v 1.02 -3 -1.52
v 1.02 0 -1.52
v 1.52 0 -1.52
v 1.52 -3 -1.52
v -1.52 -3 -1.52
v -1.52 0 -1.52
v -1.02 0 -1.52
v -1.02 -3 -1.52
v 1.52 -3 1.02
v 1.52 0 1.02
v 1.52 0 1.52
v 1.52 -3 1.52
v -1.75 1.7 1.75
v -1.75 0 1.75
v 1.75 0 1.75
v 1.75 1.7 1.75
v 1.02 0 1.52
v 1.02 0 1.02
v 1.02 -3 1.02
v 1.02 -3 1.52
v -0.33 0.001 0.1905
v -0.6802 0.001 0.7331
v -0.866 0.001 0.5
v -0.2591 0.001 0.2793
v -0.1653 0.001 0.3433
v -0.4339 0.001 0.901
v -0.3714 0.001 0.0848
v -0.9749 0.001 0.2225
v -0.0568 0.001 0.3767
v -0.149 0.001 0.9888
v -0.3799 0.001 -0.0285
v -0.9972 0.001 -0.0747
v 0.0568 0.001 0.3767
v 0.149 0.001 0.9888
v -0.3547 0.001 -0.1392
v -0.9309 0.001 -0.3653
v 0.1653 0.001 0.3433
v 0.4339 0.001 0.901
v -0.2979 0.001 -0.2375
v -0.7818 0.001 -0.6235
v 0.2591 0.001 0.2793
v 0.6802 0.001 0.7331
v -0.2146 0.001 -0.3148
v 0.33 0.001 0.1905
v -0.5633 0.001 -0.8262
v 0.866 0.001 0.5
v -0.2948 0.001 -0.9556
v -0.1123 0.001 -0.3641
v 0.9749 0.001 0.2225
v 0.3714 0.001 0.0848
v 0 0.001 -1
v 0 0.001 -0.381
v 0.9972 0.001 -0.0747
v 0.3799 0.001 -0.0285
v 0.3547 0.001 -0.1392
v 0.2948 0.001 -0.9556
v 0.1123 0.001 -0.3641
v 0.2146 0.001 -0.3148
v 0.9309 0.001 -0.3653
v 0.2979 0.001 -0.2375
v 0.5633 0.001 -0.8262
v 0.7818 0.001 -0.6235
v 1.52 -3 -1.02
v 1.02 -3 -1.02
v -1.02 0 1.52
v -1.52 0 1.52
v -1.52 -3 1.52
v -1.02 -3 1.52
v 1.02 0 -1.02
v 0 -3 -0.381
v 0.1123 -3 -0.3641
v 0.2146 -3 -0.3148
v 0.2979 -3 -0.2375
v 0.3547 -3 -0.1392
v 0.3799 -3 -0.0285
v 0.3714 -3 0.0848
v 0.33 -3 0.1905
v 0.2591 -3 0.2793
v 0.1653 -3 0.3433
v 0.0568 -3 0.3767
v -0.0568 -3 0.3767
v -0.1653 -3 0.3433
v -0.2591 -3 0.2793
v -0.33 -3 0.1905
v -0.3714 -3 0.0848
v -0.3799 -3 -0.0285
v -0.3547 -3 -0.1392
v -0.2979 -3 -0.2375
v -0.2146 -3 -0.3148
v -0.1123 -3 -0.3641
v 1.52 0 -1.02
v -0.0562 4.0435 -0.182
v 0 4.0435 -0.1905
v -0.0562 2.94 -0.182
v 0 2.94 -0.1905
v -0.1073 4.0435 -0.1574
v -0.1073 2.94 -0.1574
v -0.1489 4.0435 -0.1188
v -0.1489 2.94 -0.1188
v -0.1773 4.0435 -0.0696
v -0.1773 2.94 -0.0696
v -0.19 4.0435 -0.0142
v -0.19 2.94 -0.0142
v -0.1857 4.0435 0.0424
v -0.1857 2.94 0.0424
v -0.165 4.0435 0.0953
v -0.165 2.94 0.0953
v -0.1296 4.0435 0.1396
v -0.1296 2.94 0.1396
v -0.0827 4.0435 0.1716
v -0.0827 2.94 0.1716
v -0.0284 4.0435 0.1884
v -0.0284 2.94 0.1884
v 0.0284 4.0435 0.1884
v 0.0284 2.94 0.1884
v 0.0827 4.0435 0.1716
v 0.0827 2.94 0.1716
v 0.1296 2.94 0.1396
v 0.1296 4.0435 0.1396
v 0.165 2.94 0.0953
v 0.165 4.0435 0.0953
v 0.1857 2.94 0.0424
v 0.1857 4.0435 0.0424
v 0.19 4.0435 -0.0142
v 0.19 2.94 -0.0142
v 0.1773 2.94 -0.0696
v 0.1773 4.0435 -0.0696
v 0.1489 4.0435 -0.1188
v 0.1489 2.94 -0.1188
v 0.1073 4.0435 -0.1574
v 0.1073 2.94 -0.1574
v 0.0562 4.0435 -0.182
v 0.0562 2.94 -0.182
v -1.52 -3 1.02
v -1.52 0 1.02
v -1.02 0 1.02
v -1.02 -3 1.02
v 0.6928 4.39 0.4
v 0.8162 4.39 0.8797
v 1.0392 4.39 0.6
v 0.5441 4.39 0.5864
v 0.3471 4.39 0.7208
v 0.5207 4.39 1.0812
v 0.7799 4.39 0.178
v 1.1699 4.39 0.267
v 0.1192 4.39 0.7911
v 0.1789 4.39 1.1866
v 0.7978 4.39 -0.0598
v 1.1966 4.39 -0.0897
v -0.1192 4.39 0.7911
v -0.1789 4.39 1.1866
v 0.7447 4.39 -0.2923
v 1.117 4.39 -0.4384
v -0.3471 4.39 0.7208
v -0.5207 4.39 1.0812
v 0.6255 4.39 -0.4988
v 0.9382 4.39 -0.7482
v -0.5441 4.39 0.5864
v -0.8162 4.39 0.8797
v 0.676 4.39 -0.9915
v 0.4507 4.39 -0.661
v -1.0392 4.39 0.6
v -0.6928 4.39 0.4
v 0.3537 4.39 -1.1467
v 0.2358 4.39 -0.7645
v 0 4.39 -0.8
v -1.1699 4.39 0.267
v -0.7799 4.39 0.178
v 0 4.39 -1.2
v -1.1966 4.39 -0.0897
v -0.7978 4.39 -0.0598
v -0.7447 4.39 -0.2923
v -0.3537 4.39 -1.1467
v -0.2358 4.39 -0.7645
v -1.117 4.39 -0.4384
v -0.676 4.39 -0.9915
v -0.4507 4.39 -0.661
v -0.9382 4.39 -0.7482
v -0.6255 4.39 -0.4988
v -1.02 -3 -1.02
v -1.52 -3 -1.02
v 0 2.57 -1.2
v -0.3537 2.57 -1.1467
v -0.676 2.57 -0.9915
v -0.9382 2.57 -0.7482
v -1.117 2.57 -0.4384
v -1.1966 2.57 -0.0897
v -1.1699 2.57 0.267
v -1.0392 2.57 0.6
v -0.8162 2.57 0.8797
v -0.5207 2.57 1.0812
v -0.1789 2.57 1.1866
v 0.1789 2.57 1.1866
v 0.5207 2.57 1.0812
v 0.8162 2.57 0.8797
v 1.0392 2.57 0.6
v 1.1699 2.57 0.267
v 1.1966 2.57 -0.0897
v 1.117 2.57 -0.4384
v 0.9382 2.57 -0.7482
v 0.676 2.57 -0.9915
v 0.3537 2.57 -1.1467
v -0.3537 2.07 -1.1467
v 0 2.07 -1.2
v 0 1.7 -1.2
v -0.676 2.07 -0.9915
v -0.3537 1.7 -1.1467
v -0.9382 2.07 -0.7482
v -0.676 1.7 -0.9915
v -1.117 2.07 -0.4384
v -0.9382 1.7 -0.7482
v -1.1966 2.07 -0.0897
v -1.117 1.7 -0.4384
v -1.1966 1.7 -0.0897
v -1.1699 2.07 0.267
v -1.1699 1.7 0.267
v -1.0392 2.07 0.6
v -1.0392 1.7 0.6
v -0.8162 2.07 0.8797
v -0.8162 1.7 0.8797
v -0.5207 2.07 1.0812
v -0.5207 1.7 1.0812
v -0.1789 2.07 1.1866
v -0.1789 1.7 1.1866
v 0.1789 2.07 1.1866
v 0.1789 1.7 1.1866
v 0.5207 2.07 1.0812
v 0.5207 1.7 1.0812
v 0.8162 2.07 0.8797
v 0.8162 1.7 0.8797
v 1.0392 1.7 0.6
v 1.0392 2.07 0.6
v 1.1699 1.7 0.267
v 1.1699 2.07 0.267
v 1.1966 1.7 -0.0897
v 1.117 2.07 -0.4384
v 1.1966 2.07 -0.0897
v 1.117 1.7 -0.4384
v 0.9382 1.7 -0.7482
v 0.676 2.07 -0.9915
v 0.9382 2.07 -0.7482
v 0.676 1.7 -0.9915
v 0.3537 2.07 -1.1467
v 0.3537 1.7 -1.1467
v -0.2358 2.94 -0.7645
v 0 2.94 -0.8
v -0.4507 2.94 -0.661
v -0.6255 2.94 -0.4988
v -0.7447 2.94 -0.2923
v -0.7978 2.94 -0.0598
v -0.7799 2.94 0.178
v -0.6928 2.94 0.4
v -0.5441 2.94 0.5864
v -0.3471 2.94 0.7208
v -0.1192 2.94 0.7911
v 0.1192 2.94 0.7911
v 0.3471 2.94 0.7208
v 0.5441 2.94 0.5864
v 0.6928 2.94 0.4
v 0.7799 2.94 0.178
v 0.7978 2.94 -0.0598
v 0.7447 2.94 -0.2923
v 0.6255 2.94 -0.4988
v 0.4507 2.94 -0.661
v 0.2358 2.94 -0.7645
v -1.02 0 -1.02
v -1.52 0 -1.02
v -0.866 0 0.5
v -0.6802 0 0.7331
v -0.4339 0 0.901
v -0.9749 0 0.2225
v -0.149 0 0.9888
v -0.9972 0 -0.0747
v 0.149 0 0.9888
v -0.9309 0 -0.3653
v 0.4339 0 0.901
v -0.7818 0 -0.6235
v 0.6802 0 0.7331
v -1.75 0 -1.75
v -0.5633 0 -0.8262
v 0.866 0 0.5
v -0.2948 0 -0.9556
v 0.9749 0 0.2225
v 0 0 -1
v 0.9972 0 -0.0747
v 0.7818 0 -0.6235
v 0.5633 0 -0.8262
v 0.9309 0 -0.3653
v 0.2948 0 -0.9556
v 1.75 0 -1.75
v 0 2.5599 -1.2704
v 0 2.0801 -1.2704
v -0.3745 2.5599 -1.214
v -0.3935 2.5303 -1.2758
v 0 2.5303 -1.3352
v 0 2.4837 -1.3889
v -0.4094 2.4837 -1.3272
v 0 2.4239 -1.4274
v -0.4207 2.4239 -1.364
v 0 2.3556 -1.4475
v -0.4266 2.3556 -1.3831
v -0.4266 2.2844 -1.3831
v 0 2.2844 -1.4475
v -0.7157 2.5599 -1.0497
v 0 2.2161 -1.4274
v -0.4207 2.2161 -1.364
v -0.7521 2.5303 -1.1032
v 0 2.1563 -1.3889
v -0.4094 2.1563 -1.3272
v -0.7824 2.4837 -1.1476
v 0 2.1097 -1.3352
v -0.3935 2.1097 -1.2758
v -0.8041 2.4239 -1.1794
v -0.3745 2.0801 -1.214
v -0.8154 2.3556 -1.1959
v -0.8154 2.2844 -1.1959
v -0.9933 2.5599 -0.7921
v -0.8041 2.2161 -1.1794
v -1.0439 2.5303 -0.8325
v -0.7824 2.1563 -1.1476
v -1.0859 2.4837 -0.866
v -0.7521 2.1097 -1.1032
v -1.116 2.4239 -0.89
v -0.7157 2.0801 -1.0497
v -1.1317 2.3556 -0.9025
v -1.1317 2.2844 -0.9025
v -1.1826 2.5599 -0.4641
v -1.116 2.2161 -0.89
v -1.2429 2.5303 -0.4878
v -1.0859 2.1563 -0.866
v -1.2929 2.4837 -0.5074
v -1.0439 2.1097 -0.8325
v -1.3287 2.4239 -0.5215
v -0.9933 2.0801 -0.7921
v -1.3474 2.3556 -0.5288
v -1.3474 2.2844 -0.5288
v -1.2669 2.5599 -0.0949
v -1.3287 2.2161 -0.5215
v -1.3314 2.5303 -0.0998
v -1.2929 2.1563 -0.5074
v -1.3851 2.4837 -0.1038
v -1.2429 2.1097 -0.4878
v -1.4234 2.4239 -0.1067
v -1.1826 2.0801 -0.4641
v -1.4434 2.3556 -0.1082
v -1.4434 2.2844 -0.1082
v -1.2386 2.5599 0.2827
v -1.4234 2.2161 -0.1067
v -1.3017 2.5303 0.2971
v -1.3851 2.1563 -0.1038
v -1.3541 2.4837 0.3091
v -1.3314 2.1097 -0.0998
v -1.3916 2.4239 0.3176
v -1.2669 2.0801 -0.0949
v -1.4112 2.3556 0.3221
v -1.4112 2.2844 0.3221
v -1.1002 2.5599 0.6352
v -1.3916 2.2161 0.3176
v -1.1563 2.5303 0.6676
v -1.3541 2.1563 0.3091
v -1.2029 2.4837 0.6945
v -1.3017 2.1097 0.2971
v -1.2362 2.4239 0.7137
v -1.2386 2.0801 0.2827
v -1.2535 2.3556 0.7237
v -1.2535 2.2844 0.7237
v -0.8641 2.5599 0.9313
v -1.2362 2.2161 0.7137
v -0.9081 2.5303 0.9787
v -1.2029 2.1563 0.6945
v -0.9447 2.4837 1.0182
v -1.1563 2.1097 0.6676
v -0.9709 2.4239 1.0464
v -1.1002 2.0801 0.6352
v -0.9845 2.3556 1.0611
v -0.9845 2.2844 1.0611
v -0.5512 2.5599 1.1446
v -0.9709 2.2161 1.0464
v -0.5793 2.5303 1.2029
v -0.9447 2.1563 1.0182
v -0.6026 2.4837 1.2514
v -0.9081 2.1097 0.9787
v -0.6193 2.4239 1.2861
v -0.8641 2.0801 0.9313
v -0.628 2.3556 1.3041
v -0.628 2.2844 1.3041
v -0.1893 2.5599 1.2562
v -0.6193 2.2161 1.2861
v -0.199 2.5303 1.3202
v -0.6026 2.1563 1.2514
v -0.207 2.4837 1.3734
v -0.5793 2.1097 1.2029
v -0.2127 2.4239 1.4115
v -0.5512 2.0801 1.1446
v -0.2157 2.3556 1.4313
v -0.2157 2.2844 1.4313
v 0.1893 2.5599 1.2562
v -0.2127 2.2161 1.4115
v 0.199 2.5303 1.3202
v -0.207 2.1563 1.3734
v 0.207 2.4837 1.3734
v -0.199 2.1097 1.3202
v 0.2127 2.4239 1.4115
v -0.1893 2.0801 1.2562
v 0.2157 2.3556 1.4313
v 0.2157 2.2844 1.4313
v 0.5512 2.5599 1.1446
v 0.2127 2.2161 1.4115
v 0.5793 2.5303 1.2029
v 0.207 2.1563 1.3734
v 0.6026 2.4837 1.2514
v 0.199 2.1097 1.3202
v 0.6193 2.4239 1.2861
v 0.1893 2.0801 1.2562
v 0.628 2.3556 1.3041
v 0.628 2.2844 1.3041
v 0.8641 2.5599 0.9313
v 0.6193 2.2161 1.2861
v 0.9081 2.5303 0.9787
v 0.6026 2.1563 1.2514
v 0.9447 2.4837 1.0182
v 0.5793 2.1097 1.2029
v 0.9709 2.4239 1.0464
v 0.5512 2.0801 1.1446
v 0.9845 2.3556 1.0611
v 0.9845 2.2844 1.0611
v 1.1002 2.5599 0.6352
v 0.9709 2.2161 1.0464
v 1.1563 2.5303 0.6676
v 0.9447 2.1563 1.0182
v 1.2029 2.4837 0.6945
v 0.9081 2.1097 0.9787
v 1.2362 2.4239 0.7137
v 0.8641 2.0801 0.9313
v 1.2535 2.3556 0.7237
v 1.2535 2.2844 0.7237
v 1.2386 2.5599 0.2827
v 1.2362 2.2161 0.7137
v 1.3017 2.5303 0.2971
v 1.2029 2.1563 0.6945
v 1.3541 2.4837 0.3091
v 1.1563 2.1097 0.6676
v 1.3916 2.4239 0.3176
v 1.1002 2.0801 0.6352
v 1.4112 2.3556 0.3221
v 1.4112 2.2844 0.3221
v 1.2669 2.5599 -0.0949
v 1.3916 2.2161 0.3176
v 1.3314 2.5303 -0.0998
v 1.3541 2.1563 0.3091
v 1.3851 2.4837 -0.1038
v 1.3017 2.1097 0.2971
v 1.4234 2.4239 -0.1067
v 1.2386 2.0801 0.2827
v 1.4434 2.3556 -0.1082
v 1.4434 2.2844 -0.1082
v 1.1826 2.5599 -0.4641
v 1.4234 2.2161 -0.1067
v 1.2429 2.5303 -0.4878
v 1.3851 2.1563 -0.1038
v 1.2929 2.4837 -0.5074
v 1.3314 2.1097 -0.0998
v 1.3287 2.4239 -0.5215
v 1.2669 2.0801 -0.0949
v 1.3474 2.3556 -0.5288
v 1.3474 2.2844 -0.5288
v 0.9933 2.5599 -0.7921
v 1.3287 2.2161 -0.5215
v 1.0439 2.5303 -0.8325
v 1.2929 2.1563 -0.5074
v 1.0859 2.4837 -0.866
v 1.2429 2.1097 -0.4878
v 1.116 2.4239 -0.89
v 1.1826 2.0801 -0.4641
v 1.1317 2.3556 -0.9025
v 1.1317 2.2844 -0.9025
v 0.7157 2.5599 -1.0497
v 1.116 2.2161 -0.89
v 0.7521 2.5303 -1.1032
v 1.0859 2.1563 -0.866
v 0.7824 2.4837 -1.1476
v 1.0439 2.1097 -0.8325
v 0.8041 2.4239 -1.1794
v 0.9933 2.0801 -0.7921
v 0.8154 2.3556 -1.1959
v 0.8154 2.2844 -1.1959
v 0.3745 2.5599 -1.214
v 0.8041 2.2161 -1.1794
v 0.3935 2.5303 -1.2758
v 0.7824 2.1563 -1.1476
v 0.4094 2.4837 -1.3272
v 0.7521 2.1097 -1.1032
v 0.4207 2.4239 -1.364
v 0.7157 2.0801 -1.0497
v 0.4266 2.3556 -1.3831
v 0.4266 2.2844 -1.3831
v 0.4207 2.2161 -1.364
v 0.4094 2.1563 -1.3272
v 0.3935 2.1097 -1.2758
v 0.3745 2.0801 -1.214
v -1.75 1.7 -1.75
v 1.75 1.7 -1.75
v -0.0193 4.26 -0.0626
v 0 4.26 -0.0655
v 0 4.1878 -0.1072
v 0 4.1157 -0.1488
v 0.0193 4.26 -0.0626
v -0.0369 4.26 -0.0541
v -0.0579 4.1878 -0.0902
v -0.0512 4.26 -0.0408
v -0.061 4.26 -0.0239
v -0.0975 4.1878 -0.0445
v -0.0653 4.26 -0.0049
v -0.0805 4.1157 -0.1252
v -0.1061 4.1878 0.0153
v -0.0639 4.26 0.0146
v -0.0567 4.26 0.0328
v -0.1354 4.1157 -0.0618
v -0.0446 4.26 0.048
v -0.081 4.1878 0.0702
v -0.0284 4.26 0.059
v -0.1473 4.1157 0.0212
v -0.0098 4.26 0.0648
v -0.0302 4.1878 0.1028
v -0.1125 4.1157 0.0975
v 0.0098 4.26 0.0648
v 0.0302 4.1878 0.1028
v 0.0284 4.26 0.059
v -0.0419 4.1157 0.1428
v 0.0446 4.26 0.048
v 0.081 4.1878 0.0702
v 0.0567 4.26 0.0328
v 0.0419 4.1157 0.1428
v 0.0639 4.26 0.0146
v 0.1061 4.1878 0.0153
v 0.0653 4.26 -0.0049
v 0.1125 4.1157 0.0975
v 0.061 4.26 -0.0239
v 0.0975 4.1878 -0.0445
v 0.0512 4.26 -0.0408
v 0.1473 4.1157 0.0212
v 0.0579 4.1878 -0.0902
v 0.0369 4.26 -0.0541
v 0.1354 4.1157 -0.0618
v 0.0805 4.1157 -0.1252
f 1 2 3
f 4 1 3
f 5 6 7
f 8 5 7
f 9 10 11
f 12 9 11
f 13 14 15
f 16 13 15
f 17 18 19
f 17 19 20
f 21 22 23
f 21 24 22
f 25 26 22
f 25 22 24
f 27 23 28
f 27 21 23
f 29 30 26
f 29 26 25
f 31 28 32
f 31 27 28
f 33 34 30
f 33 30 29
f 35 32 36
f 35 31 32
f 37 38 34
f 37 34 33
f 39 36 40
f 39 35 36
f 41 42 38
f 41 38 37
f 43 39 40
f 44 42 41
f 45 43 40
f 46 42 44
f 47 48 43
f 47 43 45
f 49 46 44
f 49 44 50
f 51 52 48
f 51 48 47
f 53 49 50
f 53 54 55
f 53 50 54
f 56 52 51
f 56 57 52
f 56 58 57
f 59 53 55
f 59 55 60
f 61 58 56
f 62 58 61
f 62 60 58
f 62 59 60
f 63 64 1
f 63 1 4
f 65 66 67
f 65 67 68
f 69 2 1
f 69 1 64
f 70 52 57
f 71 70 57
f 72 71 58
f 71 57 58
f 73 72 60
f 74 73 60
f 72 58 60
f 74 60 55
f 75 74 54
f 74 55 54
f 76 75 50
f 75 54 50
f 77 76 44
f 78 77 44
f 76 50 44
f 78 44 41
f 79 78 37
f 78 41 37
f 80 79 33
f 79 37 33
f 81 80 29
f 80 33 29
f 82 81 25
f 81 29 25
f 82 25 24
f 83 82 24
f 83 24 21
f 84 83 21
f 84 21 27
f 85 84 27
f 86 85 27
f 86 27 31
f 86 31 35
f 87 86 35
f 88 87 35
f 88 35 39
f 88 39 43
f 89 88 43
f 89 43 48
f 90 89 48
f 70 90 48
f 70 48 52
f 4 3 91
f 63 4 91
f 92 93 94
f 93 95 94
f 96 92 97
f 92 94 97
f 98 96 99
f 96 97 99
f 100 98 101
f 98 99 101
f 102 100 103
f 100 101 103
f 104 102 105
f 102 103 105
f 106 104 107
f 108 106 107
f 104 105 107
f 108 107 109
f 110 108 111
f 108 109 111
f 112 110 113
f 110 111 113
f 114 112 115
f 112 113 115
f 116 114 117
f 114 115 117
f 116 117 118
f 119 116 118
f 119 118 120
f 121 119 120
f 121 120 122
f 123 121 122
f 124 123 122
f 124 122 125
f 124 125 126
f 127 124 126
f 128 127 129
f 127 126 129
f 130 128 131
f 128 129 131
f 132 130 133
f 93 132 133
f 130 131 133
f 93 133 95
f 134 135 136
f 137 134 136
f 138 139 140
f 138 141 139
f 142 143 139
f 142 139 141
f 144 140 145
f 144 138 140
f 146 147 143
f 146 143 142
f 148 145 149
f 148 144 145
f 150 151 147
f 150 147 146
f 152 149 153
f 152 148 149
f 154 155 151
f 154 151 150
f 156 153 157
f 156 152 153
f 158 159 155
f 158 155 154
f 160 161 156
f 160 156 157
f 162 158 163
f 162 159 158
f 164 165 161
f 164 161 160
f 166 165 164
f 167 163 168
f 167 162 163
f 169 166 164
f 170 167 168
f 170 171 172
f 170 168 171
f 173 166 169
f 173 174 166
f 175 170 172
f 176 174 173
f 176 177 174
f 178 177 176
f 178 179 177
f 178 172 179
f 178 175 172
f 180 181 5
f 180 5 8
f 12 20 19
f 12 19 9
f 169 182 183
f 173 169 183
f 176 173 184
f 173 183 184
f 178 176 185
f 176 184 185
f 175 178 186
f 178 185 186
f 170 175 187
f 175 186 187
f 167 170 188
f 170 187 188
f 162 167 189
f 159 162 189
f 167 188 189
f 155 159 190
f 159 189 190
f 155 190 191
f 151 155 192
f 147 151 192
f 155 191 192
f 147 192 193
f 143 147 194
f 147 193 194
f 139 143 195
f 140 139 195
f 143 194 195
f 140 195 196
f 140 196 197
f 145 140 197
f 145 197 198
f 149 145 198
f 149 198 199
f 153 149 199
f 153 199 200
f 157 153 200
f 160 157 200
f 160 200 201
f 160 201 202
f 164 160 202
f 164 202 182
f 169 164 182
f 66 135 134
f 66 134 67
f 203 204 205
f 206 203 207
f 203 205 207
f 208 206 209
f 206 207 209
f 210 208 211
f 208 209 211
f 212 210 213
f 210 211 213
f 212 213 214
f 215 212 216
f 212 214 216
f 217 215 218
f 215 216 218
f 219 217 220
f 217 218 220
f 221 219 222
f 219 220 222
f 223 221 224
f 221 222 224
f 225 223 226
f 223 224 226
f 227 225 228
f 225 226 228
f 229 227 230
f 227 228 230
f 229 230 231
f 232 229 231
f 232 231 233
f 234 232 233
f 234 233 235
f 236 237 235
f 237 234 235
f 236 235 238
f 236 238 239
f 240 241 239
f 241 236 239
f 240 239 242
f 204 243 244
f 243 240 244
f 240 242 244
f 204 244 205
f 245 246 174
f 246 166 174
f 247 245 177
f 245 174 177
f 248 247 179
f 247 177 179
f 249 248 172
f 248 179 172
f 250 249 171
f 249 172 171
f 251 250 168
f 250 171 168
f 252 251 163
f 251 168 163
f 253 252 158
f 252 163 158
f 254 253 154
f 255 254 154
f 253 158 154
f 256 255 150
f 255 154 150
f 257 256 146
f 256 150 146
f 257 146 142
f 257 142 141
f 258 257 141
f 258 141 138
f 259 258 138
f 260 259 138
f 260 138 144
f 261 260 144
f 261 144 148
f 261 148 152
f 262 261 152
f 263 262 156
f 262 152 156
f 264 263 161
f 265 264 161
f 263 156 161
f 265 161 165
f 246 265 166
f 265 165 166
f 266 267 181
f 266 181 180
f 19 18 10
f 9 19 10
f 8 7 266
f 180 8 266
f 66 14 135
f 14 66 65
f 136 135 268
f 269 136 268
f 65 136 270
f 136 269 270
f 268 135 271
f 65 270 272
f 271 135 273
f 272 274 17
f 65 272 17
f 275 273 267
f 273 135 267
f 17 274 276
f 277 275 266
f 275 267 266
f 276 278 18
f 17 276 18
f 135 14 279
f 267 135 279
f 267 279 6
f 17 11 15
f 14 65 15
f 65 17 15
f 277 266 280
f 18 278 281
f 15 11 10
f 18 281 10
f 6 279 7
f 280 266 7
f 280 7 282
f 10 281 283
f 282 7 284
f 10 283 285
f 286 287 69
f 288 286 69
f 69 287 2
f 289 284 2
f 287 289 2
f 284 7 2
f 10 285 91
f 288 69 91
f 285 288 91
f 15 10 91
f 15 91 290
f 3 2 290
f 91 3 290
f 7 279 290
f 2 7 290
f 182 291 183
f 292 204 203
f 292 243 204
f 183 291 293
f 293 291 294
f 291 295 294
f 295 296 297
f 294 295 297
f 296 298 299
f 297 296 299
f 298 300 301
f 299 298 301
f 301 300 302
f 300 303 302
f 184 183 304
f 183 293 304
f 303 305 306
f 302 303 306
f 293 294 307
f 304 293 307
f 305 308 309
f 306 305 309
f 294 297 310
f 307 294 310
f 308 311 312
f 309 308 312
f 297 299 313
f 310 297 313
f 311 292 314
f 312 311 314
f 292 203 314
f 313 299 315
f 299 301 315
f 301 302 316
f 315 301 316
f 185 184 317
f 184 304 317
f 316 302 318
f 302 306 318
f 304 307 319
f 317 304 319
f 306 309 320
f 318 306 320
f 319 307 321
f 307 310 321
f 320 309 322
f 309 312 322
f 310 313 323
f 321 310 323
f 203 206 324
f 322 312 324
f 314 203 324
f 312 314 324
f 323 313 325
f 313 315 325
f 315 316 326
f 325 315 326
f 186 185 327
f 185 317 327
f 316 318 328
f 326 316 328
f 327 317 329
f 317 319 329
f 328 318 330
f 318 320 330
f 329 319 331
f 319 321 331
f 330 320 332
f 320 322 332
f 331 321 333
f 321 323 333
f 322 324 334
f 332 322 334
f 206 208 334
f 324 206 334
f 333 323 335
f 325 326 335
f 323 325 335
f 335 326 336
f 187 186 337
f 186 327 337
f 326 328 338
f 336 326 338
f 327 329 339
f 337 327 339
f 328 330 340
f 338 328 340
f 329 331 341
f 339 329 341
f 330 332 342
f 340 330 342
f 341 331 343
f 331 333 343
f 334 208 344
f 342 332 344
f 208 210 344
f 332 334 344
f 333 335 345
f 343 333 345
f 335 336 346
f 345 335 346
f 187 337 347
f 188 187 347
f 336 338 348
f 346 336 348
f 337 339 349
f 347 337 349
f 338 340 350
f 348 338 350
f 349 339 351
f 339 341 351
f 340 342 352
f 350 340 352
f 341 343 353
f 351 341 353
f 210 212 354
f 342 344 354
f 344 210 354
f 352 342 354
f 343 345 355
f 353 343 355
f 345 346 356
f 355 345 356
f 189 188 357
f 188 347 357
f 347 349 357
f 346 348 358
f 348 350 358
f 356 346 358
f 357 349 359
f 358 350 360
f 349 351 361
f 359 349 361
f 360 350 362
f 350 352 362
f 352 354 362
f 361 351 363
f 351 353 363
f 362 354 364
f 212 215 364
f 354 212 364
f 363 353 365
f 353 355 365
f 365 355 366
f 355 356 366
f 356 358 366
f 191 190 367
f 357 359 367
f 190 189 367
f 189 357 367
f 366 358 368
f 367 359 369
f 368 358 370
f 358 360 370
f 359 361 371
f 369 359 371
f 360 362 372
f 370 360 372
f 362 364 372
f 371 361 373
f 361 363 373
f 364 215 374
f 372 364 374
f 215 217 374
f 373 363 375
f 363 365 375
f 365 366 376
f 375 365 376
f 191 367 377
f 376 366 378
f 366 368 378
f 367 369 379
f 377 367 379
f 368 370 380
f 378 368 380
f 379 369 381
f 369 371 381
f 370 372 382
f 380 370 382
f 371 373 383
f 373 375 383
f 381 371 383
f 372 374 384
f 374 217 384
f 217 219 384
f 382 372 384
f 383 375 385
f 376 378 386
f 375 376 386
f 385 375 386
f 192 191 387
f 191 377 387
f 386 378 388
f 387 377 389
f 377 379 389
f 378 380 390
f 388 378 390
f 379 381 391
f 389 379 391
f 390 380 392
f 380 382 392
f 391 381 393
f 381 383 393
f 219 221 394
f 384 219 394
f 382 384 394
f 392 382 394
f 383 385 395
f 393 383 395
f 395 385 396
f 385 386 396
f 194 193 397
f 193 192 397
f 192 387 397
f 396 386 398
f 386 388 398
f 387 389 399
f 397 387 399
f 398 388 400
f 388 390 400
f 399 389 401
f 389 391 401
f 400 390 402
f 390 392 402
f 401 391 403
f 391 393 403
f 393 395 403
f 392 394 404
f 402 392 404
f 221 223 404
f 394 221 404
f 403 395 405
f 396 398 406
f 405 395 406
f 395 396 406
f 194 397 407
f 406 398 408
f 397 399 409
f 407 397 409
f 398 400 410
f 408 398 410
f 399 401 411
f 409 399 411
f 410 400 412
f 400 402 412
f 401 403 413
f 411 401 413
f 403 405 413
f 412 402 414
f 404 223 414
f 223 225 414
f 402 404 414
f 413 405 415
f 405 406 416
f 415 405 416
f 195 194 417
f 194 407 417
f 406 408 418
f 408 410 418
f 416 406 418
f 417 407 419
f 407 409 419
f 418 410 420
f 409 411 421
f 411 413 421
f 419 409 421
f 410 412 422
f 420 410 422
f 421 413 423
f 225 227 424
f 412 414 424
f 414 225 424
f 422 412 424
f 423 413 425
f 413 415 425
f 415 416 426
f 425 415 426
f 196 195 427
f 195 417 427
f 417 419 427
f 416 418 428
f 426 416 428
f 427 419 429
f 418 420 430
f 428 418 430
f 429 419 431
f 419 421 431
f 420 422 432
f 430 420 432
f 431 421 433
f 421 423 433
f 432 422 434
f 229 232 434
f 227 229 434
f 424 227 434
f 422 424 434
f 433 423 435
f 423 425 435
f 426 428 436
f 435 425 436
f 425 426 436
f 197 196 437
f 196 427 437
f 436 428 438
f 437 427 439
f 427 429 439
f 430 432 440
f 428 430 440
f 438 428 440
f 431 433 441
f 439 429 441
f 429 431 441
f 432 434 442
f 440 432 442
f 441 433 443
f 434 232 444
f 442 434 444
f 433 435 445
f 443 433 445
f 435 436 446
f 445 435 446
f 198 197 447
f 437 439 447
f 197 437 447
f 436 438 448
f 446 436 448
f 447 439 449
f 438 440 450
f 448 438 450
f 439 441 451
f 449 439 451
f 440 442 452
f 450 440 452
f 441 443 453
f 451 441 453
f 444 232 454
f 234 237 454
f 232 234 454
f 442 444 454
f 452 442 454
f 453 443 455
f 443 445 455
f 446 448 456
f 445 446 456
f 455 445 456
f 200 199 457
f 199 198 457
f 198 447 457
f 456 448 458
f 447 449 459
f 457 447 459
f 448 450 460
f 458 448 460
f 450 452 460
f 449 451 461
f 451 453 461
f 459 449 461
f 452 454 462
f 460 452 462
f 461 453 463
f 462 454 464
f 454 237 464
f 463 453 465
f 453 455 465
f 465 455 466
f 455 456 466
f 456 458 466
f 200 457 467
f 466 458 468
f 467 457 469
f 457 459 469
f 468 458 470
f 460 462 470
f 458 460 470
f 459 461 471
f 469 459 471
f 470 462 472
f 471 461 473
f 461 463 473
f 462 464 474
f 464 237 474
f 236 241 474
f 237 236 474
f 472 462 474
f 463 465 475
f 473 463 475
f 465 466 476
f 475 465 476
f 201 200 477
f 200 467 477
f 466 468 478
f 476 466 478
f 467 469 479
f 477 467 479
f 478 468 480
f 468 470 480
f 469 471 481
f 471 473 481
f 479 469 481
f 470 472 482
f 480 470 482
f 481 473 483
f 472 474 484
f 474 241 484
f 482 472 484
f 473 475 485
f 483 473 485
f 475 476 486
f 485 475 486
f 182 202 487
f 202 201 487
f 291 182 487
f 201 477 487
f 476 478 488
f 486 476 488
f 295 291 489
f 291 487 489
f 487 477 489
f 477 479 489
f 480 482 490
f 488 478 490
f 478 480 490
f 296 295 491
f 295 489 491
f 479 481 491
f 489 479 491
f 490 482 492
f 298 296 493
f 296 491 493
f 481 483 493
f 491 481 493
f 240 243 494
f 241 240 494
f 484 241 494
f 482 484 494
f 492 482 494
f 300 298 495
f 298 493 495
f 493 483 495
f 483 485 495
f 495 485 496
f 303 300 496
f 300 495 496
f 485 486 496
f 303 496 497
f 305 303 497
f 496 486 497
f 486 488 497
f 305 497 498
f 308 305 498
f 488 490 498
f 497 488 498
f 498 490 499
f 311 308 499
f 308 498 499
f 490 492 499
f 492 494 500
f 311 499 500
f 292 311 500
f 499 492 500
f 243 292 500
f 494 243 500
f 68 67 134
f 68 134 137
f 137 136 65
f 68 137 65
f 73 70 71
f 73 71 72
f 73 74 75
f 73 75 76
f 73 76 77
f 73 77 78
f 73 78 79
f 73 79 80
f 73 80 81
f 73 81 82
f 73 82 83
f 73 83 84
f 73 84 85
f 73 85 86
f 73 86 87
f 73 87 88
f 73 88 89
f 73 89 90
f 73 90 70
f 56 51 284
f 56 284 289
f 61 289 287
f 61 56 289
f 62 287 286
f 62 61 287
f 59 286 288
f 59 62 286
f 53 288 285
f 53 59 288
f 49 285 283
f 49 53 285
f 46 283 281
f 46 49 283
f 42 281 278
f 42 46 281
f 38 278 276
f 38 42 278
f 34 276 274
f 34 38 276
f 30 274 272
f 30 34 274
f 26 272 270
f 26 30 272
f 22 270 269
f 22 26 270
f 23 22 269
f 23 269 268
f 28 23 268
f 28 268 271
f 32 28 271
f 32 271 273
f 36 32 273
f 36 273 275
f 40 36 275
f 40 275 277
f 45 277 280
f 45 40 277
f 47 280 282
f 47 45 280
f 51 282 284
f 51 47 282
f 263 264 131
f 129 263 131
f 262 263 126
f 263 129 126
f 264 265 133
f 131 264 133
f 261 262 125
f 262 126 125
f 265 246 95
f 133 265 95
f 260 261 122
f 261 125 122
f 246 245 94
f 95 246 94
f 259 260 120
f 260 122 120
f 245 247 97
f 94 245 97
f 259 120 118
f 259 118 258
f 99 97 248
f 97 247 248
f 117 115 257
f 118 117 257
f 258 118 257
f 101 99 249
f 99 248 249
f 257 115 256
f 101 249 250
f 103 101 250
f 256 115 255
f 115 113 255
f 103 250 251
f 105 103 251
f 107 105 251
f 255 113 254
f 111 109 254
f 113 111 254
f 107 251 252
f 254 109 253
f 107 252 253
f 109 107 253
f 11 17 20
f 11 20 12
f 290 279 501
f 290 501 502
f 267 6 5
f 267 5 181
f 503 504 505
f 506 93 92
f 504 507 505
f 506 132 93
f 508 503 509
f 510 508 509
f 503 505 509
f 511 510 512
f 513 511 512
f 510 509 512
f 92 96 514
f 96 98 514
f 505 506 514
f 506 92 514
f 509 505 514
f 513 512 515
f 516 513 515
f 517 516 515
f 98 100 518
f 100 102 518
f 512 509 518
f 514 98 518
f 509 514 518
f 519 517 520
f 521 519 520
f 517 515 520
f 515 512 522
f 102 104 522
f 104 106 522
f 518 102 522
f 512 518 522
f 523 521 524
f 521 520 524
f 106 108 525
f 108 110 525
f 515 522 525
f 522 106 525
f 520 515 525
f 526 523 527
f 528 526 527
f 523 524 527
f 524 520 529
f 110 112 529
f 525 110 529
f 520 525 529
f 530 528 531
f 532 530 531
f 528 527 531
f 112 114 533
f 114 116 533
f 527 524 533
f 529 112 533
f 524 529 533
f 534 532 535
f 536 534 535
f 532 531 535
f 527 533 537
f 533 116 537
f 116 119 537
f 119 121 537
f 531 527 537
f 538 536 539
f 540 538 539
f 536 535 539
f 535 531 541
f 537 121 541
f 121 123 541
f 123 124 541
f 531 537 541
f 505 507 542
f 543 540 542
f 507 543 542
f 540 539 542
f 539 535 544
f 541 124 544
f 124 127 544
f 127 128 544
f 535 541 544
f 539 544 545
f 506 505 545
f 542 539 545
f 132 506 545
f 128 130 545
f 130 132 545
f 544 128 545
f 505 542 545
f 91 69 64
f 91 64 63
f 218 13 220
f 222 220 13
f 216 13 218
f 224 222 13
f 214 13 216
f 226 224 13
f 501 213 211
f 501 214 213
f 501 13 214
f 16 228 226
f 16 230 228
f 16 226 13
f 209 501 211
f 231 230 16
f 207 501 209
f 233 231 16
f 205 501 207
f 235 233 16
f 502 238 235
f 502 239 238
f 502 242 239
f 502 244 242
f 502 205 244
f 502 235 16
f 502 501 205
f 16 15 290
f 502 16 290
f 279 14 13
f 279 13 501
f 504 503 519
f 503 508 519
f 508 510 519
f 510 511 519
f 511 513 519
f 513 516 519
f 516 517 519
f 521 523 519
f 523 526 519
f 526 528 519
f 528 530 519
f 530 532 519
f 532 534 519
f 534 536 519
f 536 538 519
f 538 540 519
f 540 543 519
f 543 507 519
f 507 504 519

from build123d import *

# Parameters (mm, degrees)
SKETCH1_W           = 3.5
SKETCH1_H           = 3.5
BOSS_EXTRUDE1_DEPTH = 1.7
SKETCH2_R           = 1.2
BOSS_EXTRUDE2_DEPTH = 2.69
SKETCH4_R           = 0.25
SKETCH5_R           = 0.381
SKETCH5_W           = 0.5
SKETCH5_H           = 0.5
BOSS_EXTRUDE3_DEPTH = 3
CUT_EXTRUDE1_START  = -0.001
SKETCH6_R           = 1
SKETCH6_R_2         = 0.381
CUT_EXTRUDE1_DEPTH  = 0.001


with BuildPart() as part:
    # Sketch1 → Boss-Extrude1 (new body)
    with BuildSketch(Plane(origin=(0, 0, 0), x_dir=(1, 0, 0), z_dir=(0, 1, 0))):
        Rectangle(SKETCH1_W, SKETCH1_H)
    extrude(amount=BOSS_EXTRUDE1_DEPTH)

    # Sketch2 → Boss-Extrude2 (add)
    with BuildSketch(Plane(origin=(0, 1.7, 0), x_dir=(1, 0, 0), z_dir=(0, 1, 0))):
        Circle(SKETCH2_R)
    extrude(amount=BOSS_EXTRUDE2_DEPTH)

    # Sketch3 → Cut-Revolve1 (revolve, cut)
    with BuildSketch(Plane(origin=(0, 0, 0), x_dir=(0, 0, -1), z_dir=(1, 0, 0))):
        Polygon((0, 4.39), (0, 4.26), (0.0655, 4.26), (0.1905, 4.043493649), (0.1905, 2.94), (0.8, 2.94), (0.8, 4.39), align=None)
    revolve(axis=Axis((0, 0, 0), (0, 1, 0)), mode=Mode.SUBTRACT)

    # Sketch4 → Revolve1 (revolve)
    with BuildSketch(Plane(origin=(0, 0, 0), x_dir=(0, 0, -1), z_dir=(1, 0, 0))):
        with Locations((-1.2, 2.32)):
            Circle(SKETCH4_R)
    revolve(axis=Axis((0, 0, 0), (0, 1, 0)))

    # Sketch5 → Boss-Extrude3 (add)
    with BuildSketch(Plane.XZ):
        Circle(SKETCH5_R)
        with Locations((-1.27, -1.27)):
            Rectangle(SKETCH5_W, SKETCH5_H)
        with Locations((1.27, -1.27)):
            Rectangle(SKETCH5_W, SKETCH5_H)
        with Locations((-1.27, 1.27)):
            Rectangle(SKETCH5_W, SKETCH5_H)
        with Locations((1.27, 1.27)):
            Rectangle(SKETCH5_W, SKETCH5_H)
    extrude(amount=BOSS_EXTRUDE3_DEPTH)

    # Sketch6 → Cut-Extrude1 (cut)
    with BuildSketch(Plane.XZ.offset(CUT_EXTRUDE1_START)):
        Circle(SKETCH6_R)
        Circle(SKETCH6_R_2, mode=Mode.SUBTRACT)
    extrude(amount=CUT_EXTRUDE1_DEPTH, mode=Mode.SUBTRACT)


solid = part.part
